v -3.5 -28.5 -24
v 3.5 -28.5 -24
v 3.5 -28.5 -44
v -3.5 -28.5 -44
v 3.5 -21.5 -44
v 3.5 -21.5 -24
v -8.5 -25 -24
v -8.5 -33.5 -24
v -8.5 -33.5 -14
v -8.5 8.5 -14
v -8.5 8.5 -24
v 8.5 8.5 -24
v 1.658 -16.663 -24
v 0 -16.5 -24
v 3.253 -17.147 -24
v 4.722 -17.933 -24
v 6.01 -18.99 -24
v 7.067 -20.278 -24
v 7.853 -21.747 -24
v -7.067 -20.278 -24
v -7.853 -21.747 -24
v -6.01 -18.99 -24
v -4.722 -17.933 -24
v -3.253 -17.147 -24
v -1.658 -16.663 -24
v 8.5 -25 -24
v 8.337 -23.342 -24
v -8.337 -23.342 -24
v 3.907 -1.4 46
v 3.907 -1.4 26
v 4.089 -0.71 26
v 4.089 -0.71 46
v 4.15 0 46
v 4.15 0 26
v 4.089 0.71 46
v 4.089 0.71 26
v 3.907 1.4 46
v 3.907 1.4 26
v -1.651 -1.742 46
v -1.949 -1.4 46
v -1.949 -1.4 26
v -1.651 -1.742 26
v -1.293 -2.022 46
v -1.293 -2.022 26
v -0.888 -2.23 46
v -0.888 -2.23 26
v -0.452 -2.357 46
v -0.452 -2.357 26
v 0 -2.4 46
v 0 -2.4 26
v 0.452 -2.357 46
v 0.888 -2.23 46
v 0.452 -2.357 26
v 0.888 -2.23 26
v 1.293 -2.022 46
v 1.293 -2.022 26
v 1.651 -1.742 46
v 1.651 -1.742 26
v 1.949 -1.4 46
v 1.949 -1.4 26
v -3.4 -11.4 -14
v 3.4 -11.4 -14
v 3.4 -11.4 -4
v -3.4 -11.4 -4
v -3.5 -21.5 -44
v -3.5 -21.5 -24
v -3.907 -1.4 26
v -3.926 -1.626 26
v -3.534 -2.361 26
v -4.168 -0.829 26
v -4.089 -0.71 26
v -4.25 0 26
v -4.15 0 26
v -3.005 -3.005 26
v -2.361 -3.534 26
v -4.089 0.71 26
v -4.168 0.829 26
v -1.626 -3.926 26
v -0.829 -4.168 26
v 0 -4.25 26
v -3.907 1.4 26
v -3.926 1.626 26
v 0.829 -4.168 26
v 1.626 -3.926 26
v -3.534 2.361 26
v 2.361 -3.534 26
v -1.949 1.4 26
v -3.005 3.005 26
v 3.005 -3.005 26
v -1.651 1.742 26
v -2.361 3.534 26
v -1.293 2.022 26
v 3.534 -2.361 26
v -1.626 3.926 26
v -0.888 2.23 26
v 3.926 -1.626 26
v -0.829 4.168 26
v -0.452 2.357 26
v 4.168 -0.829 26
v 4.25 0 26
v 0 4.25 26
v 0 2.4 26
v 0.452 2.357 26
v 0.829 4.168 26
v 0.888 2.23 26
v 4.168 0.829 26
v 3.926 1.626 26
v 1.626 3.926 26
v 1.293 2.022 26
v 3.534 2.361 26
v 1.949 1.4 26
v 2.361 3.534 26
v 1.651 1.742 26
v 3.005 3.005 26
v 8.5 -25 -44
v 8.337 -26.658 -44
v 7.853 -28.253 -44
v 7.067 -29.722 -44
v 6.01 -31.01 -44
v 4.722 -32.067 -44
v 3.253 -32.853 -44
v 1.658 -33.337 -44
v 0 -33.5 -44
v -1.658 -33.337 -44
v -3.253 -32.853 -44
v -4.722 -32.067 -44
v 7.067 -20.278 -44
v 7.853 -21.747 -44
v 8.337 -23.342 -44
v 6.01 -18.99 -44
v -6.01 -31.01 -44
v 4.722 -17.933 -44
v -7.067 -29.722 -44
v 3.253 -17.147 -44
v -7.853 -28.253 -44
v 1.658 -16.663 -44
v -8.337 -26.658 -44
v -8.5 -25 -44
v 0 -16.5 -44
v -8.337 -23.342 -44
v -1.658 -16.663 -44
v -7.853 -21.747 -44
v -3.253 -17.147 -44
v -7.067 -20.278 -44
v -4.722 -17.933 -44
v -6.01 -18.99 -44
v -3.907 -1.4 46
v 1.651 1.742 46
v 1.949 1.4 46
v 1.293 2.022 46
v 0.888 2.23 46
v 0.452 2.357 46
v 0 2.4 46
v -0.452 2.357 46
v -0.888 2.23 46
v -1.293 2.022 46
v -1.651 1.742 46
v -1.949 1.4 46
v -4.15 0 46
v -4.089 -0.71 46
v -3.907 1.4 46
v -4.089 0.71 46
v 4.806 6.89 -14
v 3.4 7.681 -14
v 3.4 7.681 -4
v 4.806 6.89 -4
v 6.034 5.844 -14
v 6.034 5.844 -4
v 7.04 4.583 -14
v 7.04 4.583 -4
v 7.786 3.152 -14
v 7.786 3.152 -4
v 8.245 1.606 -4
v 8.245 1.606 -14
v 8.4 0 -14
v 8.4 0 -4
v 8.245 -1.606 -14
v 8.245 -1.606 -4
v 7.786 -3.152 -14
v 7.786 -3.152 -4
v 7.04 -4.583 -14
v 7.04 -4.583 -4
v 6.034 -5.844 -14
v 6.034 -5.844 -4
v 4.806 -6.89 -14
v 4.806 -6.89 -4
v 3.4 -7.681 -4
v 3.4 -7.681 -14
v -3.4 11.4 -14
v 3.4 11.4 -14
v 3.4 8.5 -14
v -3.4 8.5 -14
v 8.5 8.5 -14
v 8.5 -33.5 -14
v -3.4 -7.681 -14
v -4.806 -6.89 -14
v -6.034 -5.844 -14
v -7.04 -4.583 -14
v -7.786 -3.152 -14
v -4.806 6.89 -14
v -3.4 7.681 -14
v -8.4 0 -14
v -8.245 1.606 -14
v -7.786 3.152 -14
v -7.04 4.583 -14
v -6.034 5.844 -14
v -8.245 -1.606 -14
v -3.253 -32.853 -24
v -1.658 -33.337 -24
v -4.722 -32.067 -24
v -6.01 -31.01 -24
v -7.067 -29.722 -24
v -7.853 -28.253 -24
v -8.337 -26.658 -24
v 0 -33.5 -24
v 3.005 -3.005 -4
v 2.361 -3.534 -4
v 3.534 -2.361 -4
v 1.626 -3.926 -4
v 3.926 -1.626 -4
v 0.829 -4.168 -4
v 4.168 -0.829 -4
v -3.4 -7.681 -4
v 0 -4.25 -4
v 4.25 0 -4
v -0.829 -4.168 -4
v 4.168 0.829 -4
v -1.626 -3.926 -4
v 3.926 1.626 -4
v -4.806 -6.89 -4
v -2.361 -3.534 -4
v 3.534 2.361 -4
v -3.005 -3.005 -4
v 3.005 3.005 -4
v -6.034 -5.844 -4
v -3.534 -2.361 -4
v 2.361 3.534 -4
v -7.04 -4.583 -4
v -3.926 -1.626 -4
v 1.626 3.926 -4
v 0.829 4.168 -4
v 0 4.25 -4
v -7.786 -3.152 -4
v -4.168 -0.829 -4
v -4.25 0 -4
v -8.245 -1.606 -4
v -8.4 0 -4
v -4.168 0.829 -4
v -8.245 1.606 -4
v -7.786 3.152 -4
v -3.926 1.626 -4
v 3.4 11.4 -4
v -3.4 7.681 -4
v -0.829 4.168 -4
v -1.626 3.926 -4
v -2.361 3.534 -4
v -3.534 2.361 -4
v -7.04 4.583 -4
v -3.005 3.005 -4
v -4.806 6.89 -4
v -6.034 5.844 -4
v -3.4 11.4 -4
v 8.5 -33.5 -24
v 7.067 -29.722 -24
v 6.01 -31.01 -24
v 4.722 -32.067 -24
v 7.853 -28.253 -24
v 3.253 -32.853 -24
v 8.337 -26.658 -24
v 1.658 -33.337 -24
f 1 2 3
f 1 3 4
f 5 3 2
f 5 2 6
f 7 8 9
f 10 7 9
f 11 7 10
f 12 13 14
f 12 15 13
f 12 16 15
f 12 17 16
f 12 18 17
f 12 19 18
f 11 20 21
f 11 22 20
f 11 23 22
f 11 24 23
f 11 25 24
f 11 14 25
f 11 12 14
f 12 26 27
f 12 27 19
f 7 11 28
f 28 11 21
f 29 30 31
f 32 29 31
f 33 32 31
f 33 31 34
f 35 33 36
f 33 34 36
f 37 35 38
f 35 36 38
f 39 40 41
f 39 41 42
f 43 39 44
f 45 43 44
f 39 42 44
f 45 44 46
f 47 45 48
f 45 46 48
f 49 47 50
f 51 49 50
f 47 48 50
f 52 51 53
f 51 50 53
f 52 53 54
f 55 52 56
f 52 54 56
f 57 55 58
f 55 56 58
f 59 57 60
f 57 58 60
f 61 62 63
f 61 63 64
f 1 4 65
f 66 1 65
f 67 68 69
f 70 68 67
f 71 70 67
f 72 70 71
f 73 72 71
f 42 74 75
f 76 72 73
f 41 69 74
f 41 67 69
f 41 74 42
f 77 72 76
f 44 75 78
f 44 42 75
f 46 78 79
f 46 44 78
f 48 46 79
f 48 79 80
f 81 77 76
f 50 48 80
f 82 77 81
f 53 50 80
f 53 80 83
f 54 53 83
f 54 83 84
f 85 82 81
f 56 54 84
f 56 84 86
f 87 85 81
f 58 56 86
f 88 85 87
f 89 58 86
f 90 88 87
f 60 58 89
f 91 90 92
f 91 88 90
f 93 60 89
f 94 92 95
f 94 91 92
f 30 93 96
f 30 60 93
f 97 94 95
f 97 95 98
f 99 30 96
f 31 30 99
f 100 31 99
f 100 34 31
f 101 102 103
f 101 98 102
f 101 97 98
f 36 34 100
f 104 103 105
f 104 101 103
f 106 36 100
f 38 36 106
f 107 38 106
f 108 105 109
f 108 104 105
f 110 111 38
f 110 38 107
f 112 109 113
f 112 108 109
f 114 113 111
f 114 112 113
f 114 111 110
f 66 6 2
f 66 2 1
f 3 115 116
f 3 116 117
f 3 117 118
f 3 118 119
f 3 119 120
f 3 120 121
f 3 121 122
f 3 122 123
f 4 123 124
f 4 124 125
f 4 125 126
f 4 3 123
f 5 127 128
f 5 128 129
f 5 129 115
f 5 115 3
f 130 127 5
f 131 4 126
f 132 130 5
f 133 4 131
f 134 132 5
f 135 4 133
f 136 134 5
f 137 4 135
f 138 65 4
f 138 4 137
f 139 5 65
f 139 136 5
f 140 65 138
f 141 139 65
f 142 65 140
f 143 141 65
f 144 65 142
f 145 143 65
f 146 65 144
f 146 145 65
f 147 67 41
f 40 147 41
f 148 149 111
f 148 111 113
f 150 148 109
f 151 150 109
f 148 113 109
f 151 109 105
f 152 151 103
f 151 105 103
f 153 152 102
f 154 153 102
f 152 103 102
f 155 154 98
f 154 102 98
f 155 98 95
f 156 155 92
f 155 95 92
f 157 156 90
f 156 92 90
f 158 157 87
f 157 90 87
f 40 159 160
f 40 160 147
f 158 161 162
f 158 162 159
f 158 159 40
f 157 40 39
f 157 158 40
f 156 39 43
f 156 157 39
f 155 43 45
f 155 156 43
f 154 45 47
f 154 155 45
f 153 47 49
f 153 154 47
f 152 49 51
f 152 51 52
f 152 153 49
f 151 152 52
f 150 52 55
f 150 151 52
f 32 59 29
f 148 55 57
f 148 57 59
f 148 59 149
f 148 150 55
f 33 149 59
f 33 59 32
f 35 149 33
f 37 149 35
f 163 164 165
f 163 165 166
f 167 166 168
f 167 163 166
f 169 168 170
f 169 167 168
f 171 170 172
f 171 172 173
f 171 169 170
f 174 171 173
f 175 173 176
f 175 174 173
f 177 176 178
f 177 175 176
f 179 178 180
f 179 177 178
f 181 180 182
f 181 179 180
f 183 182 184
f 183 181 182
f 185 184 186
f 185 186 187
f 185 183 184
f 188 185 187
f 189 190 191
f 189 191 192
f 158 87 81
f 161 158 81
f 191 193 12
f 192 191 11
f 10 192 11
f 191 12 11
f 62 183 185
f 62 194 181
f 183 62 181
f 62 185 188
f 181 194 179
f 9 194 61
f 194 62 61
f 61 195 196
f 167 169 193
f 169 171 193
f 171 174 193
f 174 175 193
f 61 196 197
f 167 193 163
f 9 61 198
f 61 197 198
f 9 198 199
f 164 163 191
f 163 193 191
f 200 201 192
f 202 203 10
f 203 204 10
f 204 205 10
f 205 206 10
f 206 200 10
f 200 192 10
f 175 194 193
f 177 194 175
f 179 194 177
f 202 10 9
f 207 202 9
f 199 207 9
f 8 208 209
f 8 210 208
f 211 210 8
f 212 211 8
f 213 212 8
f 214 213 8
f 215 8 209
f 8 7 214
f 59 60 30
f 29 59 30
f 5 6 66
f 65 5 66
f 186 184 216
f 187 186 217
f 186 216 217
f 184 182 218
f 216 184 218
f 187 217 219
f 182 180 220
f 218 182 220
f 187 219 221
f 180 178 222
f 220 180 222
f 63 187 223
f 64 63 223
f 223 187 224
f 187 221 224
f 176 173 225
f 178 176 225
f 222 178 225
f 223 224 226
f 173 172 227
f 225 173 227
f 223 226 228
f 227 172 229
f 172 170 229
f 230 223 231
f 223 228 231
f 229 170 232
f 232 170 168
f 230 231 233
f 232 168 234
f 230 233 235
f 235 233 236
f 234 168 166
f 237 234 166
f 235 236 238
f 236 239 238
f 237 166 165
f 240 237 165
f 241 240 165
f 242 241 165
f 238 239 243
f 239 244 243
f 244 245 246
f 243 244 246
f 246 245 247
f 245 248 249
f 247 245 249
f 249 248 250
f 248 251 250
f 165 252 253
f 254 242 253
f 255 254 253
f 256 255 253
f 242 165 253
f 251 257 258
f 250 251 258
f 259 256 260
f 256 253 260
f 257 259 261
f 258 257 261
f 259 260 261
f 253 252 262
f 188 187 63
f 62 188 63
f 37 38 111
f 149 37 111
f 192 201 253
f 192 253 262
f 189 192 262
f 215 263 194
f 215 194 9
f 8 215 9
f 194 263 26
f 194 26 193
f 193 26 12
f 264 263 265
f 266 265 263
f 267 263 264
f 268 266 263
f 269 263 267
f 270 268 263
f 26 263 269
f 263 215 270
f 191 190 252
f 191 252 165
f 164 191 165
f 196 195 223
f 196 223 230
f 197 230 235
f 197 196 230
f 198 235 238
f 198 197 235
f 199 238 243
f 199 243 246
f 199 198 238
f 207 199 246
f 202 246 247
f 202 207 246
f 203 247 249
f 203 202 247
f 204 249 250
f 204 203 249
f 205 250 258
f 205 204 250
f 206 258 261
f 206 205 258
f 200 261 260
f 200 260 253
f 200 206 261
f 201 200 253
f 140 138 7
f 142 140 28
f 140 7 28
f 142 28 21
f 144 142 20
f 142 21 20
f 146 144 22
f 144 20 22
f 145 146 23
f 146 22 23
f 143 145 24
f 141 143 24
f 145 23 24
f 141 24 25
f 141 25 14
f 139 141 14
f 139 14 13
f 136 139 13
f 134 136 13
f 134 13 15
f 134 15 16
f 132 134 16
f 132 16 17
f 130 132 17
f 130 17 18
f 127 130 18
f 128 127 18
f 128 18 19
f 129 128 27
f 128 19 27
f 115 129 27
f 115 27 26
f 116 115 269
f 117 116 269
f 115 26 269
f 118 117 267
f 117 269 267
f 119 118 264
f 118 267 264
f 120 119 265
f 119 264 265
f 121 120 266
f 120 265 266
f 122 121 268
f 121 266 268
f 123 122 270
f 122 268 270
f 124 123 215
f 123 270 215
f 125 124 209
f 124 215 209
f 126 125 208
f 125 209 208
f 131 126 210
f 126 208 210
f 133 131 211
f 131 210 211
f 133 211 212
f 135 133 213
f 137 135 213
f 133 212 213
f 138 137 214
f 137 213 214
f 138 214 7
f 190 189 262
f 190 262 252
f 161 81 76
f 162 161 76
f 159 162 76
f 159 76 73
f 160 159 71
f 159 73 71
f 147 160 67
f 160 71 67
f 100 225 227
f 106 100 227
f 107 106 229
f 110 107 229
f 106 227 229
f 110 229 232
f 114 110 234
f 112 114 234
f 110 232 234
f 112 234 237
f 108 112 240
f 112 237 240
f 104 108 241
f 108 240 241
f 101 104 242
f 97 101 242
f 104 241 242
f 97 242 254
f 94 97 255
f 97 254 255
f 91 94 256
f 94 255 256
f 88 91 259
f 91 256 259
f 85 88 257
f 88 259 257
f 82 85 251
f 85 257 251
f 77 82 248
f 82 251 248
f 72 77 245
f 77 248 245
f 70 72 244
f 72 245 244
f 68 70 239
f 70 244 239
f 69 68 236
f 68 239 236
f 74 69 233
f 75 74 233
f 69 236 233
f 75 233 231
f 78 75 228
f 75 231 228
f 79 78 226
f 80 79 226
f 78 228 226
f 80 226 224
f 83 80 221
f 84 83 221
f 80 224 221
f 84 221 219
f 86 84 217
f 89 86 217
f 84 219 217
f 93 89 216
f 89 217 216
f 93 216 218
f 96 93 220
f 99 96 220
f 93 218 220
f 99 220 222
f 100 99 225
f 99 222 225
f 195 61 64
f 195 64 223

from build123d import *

# Parameters (mm, degrees)
BOSS_EXTRUDE2_START = -20
SKETCH3_R           = 4.25
BOSS_EXTRUDE2_DEPTH = 30
BOSS_EXTRUDE3_START = 10
SKETCH4_R           = 8.5
BOSS_EXTRUDE3_DEPTH = 10
SKETCH5_W           = 17
SKETCH5_H           = 42
BOSS_EXTRUDE4_DEPTH = 10
SKETCH6_R           = 8.5
BOSS_EXTRUDE5_DEPTH = 20
SKETCH9_W           = 7
SKETCH9_H           = 7
CUT_EXTRUDE1_DEPTH  = 20
BOSS_EXTRUDE7_DEPTH = 10
BOSS_EXTRUDE8_DEPTH = 20


with BuildPart() as part:
    # Sketch3 → Boss-Extrude2 (new body)
    with BuildSketch(Plane.XY.offset(16).offset(BOSS_EXTRUDE2_START)):
        Circle(SKETCH3_R)
    extrude(amount=BOSS_EXTRUDE2_DEPTH)



with BuildPart() as body_2:
    # Sketch4 → Boss-Extrude3 (new body)
    with BuildSketch(Plane(origin=(0, 0, -4), x_dir=(-1, 0, 0), z_dir=(0, 0, -1)).offset(BOSS_EXTRUDE3_START)):
        Circle(SKETCH4_R)
    extrude(amount=BOSS_EXTRUDE3_DEPTH)

    # Sketch5 → Boss-Extrude4 (add)
    with BuildSketch(Plane(origin=(0, 0, -24), x_dir=(-1, 0, 0), z_dir=(0, 0, -1))):
        with Locations((0, -12.5)):
            Rectangle(SKETCH5_W, SKETCH5_H)
    extrude(amount=-BOSS_EXTRUDE4_DEPTH)

    # Sketch6 → Boss-Extrude5 (add)
    with BuildSketch(Plane(origin=(0, 0, -24), x_dir=(-1, 0, 0), z_dir=(0, 0, -1))):
        with Locations((0, -25)):
            Circle(SKETCH6_R)
    extrude(amount=BOSS_EXTRUDE5_DEPTH)

    # Sketch9 → Cut-Extrude1 (cut)
    with BuildSketch(Plane(origin=(0, 0, -44), x_dir=(-1, 0, 0), z_dir=(0, 0, -1))):
        with Locations((0, -25)):
            Rectangle(SKETCH9_W, SKETCH9_H)
    extrude(amount=-CUT_EXTRUDE1_DEPTH, mode=Mode.SUBTRACT)


with BuildPart() as part_1:
    add(part.part)

    add(body_2.part)  # Boss-Extrude7 merges body 2
    # Sketch11 → Boss-Extrude7 (add)
    with BuildSketch(Plane.XY.offset(-14)):
        with BuildLine():
            Line((3.4, -7.681145748), (3.4, -11.4))
            Line((3.4, -11.4), (-3.4, -11.4))
            Line((-3.4, -11.4), (-3.4, -7.681145748))
            ThreePointArc((-3.4, -7.681145748), (-8.4, 0), (-3.4, 7.681145748))
            Line((-3.4, 7.681145748), (-3.4, 11.4))
            Line((-3.4, 11.4), (3.4, 11.4))
            Line((3.4, 11.4), (3.4, 7.681145748))
            ThreePointArc((3.4, 7.681145748), (8.4, 0), (3.4, -7.681145748))
        make_face()
    extrude(amount=BOSS_EXTRUDE7_DEPTH)

    # Sketch13 → Boss-Extrude8 (add)
    with BuildSketch(Plane.XY.offset(26)):
        with BuildLine():
            Line((-1.949358869, 1.4), (-3.906724971, 1.4))
            ThreePointArc((-3.906724971, 1.4), (-4.15, 0), (-3.906724971, -1.4))
            Line((-3.906724971, -1.4), (-1.949358869, -1.4))
            ThreePointArc((-1.949358869, -1.4), (0, -2.4), (1.949358869, -1.4))
            Line((1.949358869, -1.4), (3.906724971, -1.4))
            ThreePointArc((3.906724971, -1.4), (4.15, 0), (3.906724971, 1.4))
            Line((3.906724971, 1.4), (1.949358869, 1.4))
            ThreePointArc((1.949358869, 1.4), (0, 2.4), (-1.949358869, 1.4))
        make_face()
    extrude(amount=BOSS_EXTRUDE8_DEPTH)


solid = part_1.part
